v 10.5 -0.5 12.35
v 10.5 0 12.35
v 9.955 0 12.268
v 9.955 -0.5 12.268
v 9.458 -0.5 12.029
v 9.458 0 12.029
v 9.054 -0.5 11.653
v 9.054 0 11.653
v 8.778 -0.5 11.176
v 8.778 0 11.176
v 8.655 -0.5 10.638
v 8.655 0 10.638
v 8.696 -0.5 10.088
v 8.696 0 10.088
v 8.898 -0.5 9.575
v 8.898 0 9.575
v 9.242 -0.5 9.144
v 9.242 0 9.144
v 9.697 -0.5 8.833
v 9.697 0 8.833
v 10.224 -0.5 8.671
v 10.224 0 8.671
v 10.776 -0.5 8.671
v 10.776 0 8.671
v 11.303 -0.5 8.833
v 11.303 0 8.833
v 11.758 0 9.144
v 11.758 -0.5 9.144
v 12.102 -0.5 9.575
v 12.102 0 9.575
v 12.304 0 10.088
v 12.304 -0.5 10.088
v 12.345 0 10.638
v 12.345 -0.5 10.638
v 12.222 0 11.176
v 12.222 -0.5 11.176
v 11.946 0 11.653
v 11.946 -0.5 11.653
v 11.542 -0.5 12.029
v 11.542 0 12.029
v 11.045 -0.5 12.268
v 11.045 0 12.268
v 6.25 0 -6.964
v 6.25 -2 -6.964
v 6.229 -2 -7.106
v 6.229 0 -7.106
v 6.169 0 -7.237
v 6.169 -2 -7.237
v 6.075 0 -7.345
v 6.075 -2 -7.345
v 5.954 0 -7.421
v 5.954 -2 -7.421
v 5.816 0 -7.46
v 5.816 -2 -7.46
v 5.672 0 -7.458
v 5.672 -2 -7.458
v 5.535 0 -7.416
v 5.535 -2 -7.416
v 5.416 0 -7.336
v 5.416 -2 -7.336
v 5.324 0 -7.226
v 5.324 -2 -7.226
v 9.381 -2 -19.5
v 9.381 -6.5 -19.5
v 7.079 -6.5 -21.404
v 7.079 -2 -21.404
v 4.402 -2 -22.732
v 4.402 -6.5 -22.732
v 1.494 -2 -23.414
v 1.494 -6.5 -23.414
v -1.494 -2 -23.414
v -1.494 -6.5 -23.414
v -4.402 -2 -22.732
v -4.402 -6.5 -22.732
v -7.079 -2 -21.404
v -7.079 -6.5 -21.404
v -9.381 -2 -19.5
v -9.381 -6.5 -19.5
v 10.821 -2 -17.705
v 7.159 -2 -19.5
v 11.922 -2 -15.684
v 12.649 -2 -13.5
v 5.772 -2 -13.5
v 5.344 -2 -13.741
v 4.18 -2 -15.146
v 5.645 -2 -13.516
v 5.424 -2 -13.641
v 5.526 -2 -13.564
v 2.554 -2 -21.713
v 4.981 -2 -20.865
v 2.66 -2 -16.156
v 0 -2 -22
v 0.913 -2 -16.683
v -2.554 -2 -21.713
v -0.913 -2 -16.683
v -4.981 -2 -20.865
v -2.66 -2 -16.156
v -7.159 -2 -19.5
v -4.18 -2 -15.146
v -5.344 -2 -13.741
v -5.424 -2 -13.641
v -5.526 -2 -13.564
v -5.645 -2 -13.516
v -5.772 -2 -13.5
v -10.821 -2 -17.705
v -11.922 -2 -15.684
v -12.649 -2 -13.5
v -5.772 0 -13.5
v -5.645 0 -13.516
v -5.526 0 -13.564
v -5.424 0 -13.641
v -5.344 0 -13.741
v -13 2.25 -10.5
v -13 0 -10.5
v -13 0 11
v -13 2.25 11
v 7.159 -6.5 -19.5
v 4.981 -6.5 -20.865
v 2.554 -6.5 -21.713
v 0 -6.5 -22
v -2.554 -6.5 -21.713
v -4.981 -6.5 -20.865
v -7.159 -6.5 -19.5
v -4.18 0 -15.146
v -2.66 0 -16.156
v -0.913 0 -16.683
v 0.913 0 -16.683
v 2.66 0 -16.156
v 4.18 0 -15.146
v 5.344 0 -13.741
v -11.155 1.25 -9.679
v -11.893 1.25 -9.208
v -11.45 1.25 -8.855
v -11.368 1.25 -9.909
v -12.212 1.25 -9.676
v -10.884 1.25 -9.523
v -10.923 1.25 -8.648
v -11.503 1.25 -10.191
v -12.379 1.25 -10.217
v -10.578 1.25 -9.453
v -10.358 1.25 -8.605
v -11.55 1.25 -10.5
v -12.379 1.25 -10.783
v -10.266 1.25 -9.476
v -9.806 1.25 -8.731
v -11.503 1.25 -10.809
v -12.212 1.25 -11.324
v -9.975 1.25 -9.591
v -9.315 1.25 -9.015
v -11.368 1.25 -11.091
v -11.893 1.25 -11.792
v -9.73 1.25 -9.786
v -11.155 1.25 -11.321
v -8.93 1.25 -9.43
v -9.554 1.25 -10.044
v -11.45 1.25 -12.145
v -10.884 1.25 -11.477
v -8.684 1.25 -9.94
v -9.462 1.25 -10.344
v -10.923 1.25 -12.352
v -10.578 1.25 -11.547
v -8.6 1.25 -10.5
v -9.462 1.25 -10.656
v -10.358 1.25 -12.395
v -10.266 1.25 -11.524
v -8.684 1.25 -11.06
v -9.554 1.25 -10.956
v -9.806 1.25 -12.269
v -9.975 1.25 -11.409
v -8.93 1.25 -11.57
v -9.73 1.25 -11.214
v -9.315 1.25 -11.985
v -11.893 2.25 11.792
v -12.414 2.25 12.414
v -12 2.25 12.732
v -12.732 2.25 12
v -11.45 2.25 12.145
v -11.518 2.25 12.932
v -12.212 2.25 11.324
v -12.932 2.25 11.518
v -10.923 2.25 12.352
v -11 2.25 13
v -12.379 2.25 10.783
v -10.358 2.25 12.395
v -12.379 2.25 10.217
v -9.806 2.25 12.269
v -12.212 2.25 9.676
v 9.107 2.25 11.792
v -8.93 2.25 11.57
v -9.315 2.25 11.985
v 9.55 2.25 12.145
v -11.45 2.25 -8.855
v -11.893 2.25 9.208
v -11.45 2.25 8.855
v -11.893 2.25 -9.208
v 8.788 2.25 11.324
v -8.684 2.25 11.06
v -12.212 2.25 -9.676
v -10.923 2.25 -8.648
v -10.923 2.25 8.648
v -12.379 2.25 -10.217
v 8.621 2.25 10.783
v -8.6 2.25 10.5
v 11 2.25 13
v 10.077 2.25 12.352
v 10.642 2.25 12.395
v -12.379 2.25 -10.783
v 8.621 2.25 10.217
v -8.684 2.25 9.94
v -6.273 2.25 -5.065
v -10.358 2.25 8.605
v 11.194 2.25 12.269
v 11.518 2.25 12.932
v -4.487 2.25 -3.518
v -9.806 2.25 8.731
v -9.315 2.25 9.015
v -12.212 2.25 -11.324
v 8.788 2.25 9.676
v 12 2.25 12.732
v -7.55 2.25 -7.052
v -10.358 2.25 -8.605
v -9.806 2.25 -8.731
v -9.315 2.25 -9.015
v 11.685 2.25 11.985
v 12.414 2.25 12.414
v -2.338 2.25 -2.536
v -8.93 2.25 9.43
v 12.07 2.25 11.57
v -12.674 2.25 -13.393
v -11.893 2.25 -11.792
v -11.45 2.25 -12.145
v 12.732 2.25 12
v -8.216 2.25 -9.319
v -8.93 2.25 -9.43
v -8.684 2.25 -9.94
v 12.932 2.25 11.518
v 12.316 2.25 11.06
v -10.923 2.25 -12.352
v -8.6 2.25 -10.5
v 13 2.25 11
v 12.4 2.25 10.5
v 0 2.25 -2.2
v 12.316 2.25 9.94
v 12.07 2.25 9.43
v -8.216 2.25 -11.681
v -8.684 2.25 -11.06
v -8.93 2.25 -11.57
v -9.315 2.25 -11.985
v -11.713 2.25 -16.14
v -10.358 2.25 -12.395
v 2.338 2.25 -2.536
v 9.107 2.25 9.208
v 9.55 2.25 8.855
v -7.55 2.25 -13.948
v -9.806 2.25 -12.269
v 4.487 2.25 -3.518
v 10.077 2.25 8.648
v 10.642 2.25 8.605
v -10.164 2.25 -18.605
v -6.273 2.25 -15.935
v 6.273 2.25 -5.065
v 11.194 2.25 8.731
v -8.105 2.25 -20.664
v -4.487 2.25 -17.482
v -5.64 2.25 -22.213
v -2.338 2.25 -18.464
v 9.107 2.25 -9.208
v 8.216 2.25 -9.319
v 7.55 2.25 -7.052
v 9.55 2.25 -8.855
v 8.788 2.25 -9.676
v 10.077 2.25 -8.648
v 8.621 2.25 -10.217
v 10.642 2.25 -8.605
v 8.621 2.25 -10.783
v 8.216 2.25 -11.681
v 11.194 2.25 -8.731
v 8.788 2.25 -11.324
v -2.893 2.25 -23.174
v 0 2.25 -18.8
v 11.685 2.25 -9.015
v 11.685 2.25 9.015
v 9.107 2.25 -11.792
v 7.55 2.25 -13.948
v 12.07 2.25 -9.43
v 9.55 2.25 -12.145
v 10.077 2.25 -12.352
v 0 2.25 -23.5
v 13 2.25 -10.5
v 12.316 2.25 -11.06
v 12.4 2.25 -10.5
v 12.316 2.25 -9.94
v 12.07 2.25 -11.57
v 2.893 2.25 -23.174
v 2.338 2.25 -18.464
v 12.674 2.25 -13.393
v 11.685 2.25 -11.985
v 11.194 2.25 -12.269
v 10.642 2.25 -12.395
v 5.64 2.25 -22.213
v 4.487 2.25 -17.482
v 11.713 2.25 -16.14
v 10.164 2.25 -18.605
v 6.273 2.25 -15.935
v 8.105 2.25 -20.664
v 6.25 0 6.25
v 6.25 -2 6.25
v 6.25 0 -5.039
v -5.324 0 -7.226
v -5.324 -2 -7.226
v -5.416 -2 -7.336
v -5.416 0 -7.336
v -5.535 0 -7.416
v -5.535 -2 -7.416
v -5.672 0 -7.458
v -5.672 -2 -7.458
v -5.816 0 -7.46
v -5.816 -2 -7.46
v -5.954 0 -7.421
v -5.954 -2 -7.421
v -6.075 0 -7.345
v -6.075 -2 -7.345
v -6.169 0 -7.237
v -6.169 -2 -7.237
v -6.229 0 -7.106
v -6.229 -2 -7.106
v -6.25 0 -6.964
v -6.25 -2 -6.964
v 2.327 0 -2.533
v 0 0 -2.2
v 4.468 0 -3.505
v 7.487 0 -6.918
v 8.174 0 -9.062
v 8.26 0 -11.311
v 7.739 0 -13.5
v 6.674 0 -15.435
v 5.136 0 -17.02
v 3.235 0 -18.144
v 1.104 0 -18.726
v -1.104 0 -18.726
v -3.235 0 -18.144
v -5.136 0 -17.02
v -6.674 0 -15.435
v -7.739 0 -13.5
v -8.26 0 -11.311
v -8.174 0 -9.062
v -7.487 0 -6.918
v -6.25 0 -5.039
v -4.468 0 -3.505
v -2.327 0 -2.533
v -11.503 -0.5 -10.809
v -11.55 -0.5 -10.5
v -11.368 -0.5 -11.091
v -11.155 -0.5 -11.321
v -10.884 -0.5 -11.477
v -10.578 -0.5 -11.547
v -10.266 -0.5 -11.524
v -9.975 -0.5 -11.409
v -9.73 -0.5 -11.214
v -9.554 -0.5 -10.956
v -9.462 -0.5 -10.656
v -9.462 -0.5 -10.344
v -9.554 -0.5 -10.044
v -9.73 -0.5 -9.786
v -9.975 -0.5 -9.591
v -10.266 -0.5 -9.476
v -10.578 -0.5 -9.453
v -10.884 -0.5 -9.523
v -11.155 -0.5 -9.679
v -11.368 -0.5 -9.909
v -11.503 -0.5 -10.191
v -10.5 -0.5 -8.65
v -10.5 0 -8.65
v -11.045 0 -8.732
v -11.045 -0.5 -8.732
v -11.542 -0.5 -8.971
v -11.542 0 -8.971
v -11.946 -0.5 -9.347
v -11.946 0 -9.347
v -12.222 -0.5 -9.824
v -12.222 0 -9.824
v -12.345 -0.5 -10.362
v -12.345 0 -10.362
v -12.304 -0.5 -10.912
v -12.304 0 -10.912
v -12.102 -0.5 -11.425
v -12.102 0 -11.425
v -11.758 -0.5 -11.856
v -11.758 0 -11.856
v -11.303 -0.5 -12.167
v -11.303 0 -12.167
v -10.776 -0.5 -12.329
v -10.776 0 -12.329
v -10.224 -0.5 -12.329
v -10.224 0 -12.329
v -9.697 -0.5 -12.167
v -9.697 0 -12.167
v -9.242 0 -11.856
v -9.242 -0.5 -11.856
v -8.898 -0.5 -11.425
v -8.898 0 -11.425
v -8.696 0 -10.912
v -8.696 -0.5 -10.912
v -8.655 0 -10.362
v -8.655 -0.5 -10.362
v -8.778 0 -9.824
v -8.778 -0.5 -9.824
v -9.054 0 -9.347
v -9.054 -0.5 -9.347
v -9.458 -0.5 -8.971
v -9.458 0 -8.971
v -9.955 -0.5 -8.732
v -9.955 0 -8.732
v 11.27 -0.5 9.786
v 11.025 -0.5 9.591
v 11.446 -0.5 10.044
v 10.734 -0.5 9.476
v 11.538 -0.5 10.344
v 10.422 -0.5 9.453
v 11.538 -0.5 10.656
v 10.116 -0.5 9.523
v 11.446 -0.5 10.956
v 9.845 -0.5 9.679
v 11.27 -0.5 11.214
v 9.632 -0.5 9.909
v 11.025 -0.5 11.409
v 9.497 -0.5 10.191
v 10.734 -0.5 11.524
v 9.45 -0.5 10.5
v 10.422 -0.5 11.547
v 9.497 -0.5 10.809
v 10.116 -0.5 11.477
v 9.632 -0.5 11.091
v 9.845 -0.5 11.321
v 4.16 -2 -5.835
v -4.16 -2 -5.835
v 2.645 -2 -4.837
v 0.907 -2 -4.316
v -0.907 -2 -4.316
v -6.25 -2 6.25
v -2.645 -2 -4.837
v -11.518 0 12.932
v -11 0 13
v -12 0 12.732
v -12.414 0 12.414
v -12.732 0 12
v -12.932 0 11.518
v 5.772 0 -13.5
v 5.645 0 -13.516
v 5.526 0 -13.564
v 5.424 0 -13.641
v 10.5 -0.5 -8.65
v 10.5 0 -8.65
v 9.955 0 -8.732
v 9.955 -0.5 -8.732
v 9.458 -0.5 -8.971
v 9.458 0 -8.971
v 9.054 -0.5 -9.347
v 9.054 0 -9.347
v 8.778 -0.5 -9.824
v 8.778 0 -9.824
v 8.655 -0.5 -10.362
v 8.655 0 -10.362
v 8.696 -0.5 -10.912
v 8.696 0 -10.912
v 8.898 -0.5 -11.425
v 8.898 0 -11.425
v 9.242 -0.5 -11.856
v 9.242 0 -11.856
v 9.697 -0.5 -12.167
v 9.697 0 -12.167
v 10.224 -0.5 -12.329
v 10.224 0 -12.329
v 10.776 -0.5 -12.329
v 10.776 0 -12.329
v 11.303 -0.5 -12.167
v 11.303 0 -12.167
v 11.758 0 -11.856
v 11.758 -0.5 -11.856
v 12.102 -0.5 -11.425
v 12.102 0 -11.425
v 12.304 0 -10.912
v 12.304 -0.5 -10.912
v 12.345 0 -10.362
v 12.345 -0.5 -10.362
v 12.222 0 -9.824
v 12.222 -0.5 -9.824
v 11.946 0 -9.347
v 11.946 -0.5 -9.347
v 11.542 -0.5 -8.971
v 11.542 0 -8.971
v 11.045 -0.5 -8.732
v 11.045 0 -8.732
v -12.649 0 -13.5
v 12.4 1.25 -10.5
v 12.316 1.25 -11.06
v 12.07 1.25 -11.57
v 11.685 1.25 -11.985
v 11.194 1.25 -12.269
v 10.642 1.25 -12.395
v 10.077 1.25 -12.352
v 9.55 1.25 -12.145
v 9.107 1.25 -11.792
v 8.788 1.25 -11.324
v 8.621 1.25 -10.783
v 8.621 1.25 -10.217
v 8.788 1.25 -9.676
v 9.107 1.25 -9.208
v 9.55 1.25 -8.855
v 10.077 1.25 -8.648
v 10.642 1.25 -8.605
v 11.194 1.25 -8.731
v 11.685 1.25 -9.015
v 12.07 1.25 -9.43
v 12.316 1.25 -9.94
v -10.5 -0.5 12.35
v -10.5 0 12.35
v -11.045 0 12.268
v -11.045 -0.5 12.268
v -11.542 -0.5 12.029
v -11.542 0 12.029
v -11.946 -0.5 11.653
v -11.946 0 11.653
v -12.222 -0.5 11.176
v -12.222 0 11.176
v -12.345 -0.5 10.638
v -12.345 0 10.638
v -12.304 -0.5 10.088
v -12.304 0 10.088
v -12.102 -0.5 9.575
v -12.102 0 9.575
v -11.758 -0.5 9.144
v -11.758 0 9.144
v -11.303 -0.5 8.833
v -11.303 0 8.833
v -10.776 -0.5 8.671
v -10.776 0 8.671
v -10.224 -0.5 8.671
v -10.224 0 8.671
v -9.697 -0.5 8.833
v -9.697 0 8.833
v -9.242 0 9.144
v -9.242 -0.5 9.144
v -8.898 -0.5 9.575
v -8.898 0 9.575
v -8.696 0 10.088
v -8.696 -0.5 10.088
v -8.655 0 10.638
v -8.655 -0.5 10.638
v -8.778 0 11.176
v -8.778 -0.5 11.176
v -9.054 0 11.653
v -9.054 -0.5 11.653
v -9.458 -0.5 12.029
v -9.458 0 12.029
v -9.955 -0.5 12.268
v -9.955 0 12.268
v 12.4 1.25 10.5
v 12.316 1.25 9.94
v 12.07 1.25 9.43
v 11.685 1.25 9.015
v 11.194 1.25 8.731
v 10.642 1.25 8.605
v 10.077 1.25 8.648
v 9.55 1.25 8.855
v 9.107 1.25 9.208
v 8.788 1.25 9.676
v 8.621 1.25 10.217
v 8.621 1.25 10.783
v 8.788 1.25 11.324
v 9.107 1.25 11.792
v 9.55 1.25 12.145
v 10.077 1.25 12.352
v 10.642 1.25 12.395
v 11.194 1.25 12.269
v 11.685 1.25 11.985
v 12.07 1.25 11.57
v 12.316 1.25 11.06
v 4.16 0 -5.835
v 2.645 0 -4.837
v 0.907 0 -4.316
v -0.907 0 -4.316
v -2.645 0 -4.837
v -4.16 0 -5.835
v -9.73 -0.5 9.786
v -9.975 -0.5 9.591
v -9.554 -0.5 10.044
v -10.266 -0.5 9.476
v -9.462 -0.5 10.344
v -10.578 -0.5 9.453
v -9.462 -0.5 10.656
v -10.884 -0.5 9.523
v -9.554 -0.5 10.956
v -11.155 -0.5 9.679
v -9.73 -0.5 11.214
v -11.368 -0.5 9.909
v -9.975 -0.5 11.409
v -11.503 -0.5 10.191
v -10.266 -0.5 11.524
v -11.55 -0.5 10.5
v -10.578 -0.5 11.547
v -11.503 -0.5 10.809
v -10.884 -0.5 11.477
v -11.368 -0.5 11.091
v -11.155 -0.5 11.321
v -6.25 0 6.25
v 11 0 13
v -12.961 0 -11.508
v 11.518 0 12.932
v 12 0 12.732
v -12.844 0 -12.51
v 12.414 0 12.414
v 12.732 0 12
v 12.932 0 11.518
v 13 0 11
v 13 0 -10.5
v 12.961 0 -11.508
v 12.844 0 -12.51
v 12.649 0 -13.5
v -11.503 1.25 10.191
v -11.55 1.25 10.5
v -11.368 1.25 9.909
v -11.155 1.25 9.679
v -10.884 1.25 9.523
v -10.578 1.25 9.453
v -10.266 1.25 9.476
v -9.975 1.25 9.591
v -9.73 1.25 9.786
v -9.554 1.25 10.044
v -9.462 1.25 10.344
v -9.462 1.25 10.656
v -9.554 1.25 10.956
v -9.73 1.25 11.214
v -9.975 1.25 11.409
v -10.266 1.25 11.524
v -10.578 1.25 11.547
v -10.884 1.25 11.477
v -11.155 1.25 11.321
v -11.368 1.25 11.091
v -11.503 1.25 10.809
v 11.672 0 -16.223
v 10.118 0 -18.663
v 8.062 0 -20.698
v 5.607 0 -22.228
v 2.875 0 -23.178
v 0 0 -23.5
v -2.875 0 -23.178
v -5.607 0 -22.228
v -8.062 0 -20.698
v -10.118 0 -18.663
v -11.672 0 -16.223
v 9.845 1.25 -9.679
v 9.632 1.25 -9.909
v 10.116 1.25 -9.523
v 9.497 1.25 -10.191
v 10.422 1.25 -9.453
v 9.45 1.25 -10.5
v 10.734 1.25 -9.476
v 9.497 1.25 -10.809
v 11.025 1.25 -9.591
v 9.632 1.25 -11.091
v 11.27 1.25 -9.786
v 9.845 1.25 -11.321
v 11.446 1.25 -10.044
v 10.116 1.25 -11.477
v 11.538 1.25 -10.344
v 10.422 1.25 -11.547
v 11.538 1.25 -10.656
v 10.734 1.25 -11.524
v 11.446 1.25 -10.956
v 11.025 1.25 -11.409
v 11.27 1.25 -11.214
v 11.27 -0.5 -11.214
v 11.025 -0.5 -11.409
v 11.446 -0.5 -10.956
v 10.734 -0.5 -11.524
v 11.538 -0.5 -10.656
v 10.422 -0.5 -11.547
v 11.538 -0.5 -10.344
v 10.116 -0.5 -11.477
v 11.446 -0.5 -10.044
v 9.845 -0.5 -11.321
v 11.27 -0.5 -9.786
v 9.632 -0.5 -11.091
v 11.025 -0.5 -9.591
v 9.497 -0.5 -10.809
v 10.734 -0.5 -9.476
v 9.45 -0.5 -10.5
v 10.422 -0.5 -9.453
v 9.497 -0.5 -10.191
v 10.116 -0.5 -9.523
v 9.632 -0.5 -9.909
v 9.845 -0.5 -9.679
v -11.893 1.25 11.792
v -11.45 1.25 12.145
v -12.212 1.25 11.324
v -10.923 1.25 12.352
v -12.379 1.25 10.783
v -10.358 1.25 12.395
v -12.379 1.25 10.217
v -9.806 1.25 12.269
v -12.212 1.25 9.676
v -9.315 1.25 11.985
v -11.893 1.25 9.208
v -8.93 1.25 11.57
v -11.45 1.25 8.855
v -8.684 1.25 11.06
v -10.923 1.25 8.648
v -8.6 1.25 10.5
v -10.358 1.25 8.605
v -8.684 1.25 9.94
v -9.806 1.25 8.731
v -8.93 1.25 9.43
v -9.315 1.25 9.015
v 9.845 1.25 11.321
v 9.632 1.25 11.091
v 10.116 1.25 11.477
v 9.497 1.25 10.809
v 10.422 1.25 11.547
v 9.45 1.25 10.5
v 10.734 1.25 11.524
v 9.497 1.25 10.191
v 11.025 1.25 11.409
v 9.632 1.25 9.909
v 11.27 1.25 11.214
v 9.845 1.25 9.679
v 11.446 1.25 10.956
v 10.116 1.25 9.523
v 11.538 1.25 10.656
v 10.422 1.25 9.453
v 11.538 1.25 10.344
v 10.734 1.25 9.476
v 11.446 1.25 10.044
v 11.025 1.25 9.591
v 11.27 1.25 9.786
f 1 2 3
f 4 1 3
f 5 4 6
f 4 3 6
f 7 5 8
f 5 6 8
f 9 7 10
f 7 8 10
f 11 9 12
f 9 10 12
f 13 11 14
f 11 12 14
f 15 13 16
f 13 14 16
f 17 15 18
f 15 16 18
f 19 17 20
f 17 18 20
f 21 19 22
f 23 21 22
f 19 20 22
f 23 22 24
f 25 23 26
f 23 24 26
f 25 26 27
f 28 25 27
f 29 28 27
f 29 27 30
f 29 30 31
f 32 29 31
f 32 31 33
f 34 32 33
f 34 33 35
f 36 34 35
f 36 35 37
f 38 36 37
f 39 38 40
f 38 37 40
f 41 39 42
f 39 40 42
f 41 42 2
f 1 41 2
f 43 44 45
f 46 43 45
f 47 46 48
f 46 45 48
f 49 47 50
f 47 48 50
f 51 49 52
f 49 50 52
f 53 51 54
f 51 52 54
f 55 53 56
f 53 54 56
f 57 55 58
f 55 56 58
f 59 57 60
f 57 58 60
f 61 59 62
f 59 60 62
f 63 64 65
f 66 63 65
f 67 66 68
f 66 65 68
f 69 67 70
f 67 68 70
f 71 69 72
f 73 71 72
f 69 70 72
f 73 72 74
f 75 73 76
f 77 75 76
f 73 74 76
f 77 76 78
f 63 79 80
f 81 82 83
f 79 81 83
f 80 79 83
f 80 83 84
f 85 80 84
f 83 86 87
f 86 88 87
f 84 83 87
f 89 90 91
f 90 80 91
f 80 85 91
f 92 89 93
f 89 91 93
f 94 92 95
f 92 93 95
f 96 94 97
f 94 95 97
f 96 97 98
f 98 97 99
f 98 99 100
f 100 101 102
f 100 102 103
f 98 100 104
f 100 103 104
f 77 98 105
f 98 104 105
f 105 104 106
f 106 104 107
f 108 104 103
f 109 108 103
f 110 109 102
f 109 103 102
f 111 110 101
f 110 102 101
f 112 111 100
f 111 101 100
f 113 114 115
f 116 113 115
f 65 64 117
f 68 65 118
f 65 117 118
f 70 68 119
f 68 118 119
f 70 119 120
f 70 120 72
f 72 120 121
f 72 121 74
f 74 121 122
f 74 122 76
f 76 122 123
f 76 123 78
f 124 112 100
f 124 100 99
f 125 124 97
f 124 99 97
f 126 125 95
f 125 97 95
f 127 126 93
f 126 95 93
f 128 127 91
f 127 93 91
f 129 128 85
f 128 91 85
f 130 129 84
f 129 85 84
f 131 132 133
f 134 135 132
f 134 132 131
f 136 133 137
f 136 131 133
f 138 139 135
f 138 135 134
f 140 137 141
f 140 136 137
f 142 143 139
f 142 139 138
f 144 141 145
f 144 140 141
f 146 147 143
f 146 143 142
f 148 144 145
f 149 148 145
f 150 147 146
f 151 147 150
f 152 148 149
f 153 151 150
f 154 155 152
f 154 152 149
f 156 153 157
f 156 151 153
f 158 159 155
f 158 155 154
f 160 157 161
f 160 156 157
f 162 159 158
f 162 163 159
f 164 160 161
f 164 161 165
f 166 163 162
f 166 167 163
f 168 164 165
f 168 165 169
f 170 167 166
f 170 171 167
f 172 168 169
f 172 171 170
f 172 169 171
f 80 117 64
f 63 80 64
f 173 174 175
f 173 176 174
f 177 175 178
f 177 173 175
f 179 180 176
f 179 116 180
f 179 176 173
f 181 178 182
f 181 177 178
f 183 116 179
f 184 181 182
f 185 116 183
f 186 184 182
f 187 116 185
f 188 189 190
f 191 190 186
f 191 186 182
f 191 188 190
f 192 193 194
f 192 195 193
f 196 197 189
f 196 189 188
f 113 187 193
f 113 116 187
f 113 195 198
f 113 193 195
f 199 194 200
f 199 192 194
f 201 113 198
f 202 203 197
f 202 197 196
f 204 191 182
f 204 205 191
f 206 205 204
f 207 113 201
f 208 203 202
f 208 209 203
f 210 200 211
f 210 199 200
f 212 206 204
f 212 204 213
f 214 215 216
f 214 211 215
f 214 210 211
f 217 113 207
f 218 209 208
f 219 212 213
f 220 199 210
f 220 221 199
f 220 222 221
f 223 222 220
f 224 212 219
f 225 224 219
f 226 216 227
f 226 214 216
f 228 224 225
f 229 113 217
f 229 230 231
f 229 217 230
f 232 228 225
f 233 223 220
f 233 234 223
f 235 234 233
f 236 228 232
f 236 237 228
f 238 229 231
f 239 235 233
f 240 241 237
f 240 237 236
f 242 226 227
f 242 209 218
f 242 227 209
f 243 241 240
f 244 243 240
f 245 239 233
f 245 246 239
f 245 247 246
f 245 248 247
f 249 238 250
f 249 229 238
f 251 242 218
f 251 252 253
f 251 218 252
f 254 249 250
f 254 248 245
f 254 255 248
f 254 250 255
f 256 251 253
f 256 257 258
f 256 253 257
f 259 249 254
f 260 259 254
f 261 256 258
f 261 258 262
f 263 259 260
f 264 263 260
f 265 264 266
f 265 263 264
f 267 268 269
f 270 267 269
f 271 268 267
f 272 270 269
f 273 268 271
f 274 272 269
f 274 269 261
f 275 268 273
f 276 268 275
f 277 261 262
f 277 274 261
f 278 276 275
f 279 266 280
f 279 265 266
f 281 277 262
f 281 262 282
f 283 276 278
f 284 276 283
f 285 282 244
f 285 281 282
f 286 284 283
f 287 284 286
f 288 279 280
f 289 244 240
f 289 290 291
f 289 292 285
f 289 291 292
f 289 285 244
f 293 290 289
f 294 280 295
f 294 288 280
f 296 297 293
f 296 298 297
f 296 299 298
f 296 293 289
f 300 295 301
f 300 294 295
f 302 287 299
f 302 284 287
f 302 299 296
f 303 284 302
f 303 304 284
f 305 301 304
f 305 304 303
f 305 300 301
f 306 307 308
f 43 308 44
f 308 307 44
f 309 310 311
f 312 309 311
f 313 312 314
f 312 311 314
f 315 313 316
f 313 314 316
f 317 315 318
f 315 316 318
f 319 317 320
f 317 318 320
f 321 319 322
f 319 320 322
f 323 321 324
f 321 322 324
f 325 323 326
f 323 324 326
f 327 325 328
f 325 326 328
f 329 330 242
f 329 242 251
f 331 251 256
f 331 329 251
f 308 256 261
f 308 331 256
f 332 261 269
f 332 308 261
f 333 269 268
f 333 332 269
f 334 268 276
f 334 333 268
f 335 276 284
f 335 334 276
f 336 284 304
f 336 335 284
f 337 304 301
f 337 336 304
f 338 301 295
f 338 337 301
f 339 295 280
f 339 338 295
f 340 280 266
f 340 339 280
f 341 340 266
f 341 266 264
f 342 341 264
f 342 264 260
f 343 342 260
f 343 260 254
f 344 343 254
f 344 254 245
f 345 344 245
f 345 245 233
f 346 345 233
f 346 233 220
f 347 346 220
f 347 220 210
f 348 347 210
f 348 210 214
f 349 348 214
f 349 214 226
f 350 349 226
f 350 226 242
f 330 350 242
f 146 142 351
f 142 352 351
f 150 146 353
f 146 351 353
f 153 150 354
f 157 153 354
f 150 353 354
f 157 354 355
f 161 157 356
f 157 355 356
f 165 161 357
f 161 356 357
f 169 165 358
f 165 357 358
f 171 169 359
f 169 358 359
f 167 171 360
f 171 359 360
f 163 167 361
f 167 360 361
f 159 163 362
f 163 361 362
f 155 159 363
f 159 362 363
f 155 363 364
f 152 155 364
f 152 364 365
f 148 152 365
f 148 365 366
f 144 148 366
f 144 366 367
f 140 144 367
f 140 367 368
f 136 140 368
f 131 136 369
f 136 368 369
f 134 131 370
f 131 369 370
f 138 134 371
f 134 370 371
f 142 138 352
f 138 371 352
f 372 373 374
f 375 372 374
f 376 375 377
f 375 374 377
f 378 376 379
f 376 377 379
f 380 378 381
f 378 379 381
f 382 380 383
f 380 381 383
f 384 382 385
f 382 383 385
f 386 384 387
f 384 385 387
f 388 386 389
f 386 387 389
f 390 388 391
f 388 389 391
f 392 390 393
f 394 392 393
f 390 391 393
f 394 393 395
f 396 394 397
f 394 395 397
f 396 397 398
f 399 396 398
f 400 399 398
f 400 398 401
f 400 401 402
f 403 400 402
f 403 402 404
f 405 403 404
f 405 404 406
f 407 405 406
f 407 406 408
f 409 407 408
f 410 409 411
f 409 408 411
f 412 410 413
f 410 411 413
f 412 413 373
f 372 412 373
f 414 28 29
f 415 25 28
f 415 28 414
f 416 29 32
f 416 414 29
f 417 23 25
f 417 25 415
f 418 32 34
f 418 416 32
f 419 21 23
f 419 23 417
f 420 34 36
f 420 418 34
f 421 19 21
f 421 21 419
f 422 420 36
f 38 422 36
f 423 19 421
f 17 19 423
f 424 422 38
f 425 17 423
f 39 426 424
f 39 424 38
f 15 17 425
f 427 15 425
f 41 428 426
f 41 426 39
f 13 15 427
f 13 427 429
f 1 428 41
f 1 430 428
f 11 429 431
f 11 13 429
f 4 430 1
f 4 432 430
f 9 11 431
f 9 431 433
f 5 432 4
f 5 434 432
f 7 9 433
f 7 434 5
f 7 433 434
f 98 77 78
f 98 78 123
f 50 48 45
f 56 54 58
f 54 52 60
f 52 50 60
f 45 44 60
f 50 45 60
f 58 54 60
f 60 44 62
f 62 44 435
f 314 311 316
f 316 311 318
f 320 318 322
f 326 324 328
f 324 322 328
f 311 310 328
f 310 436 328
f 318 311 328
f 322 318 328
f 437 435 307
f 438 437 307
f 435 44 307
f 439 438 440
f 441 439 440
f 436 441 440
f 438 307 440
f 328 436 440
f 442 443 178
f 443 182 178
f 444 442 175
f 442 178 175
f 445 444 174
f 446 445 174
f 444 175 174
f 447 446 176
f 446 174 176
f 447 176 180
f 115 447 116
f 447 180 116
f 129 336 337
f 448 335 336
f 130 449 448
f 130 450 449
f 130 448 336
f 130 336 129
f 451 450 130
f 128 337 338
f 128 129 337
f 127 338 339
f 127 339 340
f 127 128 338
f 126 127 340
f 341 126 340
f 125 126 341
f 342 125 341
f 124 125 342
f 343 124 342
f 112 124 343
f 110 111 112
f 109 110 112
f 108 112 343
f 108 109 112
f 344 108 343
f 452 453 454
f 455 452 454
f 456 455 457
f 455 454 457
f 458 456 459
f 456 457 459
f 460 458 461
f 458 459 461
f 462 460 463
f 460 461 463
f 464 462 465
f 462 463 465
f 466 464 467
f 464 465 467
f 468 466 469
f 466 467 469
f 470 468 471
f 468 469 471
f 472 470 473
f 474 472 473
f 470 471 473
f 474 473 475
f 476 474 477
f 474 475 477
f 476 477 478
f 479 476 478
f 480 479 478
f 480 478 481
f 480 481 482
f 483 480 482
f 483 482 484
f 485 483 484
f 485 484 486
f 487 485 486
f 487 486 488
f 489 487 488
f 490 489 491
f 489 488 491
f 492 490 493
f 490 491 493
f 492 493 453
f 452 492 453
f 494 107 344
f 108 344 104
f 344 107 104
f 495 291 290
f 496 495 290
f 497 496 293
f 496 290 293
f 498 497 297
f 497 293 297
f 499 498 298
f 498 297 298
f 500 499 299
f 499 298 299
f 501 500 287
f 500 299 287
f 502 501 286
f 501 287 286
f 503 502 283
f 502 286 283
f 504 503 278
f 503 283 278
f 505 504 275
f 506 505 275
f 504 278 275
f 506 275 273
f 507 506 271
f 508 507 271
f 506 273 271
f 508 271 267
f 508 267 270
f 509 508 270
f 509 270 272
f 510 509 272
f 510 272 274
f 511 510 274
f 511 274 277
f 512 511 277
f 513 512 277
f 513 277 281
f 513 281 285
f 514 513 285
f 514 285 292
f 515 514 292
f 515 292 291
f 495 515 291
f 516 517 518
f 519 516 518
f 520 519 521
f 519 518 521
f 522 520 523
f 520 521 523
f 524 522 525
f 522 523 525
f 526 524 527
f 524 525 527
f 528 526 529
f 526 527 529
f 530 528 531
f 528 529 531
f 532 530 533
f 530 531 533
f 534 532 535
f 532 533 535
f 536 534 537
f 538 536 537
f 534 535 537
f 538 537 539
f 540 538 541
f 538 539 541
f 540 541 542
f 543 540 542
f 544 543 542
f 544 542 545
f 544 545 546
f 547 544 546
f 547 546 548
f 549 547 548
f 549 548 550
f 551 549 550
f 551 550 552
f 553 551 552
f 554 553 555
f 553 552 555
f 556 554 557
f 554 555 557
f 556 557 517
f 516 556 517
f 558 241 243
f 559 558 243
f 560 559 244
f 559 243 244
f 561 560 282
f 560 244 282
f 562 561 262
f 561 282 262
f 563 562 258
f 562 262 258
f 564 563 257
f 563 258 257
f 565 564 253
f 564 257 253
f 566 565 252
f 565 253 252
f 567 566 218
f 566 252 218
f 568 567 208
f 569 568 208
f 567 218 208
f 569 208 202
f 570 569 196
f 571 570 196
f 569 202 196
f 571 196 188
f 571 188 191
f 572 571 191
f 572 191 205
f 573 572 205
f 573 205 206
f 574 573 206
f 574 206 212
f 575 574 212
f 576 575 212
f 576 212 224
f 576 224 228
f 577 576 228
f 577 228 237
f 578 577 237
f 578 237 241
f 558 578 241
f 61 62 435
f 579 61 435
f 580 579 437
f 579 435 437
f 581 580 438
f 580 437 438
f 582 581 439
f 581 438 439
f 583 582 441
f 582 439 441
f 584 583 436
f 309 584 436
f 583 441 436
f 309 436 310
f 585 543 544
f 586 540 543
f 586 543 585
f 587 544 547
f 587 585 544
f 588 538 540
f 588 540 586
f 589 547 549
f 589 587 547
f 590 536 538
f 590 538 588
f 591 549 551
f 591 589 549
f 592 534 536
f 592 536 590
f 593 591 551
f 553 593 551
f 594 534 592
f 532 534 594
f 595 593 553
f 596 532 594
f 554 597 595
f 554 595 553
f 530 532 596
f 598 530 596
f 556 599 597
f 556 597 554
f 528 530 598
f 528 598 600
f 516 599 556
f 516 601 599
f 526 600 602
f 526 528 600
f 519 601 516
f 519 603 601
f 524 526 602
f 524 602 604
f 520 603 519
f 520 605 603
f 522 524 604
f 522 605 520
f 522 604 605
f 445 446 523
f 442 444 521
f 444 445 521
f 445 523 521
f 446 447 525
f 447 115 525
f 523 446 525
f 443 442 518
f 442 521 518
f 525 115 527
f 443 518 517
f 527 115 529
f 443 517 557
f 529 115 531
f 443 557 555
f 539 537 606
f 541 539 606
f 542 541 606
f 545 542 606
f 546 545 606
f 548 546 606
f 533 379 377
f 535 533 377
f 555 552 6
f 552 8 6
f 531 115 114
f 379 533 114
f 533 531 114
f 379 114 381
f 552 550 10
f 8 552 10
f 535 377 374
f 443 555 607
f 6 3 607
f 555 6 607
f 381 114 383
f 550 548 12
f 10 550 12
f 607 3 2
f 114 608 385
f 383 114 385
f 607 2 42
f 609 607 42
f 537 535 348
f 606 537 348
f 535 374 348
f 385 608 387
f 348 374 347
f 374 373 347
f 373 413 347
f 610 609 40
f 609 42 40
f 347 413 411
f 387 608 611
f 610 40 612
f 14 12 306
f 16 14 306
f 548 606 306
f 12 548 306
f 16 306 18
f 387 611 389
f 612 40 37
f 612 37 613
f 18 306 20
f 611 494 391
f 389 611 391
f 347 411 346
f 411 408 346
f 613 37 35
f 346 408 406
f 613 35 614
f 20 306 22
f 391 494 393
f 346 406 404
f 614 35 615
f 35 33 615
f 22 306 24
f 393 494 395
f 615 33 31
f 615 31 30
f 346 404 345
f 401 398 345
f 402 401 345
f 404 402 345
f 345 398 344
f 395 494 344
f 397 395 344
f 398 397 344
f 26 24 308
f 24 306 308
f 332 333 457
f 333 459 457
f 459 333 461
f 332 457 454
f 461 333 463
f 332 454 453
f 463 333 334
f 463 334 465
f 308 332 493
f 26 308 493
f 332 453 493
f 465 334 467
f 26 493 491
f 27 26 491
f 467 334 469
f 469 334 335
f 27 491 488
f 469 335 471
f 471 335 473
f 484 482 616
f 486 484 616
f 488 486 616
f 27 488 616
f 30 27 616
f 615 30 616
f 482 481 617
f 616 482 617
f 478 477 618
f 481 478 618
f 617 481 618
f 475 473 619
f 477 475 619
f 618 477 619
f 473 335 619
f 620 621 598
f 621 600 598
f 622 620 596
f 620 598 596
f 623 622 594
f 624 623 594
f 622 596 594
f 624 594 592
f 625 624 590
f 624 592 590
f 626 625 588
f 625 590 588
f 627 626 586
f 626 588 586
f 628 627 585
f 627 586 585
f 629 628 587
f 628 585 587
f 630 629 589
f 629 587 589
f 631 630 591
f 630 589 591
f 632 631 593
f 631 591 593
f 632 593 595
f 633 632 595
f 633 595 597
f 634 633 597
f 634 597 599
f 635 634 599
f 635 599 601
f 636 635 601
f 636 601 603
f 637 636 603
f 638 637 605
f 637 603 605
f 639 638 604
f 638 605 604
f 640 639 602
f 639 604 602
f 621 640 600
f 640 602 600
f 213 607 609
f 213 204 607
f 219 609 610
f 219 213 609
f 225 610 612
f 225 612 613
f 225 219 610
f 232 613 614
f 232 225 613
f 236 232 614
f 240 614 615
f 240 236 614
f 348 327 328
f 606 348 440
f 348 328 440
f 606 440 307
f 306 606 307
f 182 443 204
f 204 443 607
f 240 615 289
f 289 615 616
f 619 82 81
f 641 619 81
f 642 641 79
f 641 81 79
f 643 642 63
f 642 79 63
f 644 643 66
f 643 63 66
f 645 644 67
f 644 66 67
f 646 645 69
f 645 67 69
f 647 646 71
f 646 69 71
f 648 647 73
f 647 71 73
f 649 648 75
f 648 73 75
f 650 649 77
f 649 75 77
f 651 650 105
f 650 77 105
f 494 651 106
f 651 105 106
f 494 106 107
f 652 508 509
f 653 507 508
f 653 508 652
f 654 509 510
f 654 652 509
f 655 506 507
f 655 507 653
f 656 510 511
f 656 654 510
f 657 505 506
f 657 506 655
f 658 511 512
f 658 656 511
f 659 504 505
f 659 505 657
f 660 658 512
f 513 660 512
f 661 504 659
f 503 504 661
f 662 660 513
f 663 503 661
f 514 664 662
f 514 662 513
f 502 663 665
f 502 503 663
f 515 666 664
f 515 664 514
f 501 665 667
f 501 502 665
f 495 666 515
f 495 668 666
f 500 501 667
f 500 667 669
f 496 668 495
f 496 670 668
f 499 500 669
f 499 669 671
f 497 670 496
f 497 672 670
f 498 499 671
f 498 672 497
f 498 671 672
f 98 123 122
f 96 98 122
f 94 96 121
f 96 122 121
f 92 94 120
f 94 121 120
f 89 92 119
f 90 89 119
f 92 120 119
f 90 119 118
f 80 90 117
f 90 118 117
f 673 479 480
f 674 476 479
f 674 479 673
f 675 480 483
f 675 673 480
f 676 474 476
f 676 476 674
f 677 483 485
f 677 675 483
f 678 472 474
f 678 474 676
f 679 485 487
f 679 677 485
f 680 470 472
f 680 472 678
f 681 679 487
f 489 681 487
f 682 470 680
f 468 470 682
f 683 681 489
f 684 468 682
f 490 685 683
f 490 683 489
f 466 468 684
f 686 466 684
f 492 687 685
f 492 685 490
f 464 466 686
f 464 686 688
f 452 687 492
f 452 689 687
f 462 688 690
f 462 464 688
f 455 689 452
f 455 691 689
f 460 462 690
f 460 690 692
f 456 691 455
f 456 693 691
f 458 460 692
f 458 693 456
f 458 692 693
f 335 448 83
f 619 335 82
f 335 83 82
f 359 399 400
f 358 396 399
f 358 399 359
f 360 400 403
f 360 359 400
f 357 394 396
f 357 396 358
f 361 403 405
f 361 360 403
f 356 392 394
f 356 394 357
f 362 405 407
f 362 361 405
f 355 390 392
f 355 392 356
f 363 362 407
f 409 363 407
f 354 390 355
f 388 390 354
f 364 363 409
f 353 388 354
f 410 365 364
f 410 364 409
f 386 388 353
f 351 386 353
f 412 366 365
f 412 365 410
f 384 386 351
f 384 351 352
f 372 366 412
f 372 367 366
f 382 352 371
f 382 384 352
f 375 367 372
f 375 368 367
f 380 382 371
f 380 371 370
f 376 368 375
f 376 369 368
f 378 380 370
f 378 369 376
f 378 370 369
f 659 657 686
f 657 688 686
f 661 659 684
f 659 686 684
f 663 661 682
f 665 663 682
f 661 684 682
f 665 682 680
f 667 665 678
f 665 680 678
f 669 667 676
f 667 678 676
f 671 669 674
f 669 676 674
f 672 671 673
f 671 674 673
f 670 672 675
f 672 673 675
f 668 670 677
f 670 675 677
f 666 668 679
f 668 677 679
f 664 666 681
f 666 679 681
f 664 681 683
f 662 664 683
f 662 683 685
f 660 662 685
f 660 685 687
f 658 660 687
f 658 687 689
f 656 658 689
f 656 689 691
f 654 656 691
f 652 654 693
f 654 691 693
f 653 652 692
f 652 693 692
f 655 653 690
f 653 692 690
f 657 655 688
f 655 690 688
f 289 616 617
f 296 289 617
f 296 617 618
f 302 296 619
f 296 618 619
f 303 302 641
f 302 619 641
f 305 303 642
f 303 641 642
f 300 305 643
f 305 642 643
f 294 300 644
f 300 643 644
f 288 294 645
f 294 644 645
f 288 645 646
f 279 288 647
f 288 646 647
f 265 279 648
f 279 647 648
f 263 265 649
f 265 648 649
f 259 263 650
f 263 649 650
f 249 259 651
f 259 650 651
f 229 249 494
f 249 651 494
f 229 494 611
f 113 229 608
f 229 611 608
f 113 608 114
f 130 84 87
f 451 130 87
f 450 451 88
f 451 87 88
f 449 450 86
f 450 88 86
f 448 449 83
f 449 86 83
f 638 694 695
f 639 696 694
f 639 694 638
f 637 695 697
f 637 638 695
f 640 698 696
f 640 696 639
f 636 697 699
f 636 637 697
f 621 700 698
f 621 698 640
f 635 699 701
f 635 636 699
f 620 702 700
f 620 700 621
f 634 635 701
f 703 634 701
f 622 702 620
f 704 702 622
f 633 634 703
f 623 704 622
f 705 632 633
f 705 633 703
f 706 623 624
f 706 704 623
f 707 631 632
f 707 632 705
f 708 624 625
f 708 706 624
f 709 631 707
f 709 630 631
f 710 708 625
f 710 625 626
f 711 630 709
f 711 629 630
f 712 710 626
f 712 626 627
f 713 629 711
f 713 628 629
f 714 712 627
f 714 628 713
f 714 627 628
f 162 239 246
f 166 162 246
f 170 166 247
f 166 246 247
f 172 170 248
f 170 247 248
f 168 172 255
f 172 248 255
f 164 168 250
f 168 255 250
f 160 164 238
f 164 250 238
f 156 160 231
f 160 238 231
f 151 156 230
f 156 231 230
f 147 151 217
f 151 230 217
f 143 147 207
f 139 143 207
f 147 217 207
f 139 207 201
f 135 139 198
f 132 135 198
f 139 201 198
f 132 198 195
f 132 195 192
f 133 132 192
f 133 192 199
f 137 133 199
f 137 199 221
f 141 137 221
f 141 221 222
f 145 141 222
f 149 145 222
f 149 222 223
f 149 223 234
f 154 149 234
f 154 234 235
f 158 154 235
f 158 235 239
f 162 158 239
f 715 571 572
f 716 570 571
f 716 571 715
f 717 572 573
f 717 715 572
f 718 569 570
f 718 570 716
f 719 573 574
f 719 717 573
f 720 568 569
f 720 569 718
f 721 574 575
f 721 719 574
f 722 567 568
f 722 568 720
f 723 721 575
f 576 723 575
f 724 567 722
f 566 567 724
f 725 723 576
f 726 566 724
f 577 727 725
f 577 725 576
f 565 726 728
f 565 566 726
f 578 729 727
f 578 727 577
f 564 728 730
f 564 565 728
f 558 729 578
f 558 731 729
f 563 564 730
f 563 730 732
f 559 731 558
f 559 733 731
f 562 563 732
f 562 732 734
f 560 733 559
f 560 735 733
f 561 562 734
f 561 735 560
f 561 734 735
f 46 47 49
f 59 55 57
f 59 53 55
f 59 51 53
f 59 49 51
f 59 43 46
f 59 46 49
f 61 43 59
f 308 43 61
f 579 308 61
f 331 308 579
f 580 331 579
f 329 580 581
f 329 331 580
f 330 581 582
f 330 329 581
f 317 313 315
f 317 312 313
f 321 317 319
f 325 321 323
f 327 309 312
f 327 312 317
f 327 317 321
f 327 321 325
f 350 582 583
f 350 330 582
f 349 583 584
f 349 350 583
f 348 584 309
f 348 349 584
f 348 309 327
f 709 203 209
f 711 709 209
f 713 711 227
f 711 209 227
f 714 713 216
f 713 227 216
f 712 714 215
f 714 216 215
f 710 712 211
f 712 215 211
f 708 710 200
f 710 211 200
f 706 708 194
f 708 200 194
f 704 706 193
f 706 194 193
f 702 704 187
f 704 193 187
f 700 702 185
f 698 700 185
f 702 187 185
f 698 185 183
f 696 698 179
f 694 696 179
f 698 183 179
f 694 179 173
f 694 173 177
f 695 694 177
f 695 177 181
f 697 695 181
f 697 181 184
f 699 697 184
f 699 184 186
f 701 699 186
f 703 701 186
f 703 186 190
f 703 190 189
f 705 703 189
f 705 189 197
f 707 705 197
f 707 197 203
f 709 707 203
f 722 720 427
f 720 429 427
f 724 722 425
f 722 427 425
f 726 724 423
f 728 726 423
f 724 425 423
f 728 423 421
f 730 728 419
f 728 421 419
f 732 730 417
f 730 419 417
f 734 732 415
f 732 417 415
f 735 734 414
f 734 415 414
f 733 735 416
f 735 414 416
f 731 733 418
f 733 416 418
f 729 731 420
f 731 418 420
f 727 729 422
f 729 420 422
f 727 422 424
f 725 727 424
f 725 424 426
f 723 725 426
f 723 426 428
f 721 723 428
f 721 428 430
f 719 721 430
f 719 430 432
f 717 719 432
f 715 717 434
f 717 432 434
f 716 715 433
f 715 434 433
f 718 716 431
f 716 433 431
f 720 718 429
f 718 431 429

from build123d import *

# Parameters (mm, degrees)
SKETCH_1_R                   = 8.3
EXTRUDE_1_DEPTH              = 2.25
EXTRUDE_START                = 2
EXTRUDE_2_DEPTH              = 2
EXTRUDE_START_2              = 4.5
EXTRUDE_3_DEPTH              = 4.5
EXTRUDE_4_DEPTH              = 2
FILLET_1_R                   = 0.5
SKETCH_5_R                   = 1.85
EXTRUDE_5_DEPTH              = 0.5
HOLE_WIZARD_M2_1_D           = 2.1
HOLE_WIZARD_M2_1_CBORE_D     = 3.8
HOLE_WIZARD_M2_1_CBORE_DEPTH = 1
FILLET_2_R                   = 2


with BuildPart() as part:
    # ｽｹｯﾁ1 → ﾎﾞｽ - 押し出し1 (new body)
    with BuildSketch(Plane(origin=(0, 0, 0), x_dir=(1, 0, 0), z_dir=(0, 1, 0))):
        with BuildLine():
            ThreePointArc((13, 10.5), (0, 23.5), (-13, 10.5))
            Line((-13, 10.5), (-13, -13))
            Line((-13, -13), (13, -13))
            Line((13, -13), (13, 10.5))
        make_face()
        with Locations(Location((0, 10.5, 0), (0, 0, 270))):
            Circle(SKETCH_1_R, mode=Mode.SUBTRACT)
    extrude(amount=EXTRUDE_1_DEPTH)

    # ｽｹｯﾁ2 → ﾎﾞｽ - 押し出し2 (add)
    with BuildSketch(Plane.XZ.offset(EXTRUDE_START)):
        with BuildLine():
            Line((-12.649110641, -13.5), (-5.48292805, -13.5))
            ThreePointArc((-5.48292805, -13.5), (0, -16.75), (5.48292805, -13.5))
            Line((5.48292805, -13.5), (12.649110641, -13.5))
            ThreePointArc((12.649110641, -13.5), (0, -23.5), (-12.649110641, -13.5))
        make_face()
    extrude(amount=-EXTRUDE_2_DEPTH)

    # ｽｹｯﾁ3 → ﾎﾞｽ - 押し出し3 (add)
    with BuildSketch(Plane.XZ.offset(2).offset(EXTRUDE_START_2)):
        with BuildLine():
            Line((-9.38083152, -19.5), (-7.158910532, -19.5))
            ThreePointArc((-7.158910532, -19.5), (0, -22), (7.158910532, -19.5))
            Line((7.158910532, -19.5), (9.38083152, -19.5))
            ThreePointArc((9.38083152, -19.5), (0, -23.5), (-9.38083152, -19.5))
        make_face()
    extrude(amount=-EXTRUDE_3_DEPTH)

    # ｽｹｯﾁ4 → ﾎﾞｽ - 押し出し4 (add)
    with BuildSketch(Plane.XZ.offset(EXTRUDE_START)):
        with BuildLine():
            Line((-6.25, 6.25), (6.25, 6.25))
            Line((6.25, 6.25), (6.25, -10.5))
            ThreePointArc((6.25, -10.5), (0, -4.25), (-6.25, -10.5))
            Line((-6.25, -10.5), (-6.25, 6.25))
        make_face()
    extrude(amount=-EXTRUDE_4_DEPTH)

    # ﾌｨﾚｯﾄ1
    # the kernel refuses this fillet: 0.5 mm, written as the material it takes off along each edge
    with BuildSketch(Plane(origin=(5.48292805, -2.721925351, -13.5), x_dir=(1, 0, 0), z_dir=(0, 1, 0))) as fillet_1_piece_1:
        with BuildLine():
            CenterArc((0.28877014, 0.5), FILLET_1_R, 211.232929016, 58.767070984)
            ThreePointArc((-0.138763059, 0.240740741), (-0.068043475, 0.121141625), (0, 0))
            Line((0, 0), (0.28877014, 0))
        make_face()
    extrude(amount=3.443850702, mode=Mode.SUBTRACT)
    with BuildSketch(Plane(origin=(-5.48292805, -2.721925351, -13.5), x_dir=(-1, 0, 0), z_dir=(0, 1, 0))) as fillet_1_piece_2:
        with BuildLine():
            CenterArc((0.28877014, -0.5), FILLET_1_R, 90, 58.767070984)
            ThreePointArc((-0.138763059, -0.240740741), (-0.068043475, -0.121141625), (0, 0))
            Line((0, 0), (0.28877014, 0))
        make_face()
    extrude(amount=3.443850702, mode=Mode.SUBTRACT)
    with BuildSketch(Plane(origin=(-6.25, -10.838834765, -10.5), x_dir=(0, 0, 1), z_dir=(0, 1, 0))) as fillet_1_piece_3:
        with BuildLine():
            CenterArc((3.535533906, 0.5), FILLET_1_R, 121.586338097, 148.413661903)
            ThreePointArc((3.273642506, 0.925925926), (1.701034544, 0.235934696), (0, 0))
            Line((0, 0), (3.535533906, 0))
        make_face()
    extrude(amount=19.67766953, mode=Mode.SUBTRACT)
    with BuildSketch(Plane(origin=(6.25, -10.838834765, -10.5), x_dir=(0, 0, 1), z_dir=(0, 1, 0))) as fillet_1_piece_4:
        with BuildLine():
            CenterArc((3.535533906, -0.5), FILLET_1_R, 90, 148.413661903)
            ThreePointArc((3.273642506, -0.925925926), (1.701034544, -0.235934696), (0, 0))
            Line((0, 0), (3.535533906, 0))
        make_face()
    extrude(amount=19.67766953, mode=Mode.SUBTRACT)

    # ｽｹｯﾁ5 → ﾎﾞｽ - 押し出し5 (add)
    with BuildSketch(Plane.XZ):
        with Locations(Location((-10.5, 10.5, 0), (0, 0, 90))):
            Circle(SKETCH_5_R)
        with Locations(Location((10.5, 10.5, 0), (0, 0, 90))):
            Circle(SKETCH_5_R)
        with Locations(Location((-10.5, -10.5, 0), (0, 0, 90))):
            Circle(SKETCH_5_R)
        with Locations(Location((10.5, -10.5, 0), (0, 0, 90))):
            Circle(SKETCH_5_R)
    extrude(amount=EXTRUDE_5_DEPTH)

    # M2 丸平ねじ用座ぐり穴1 (through all)
    with Locations(Plane(origin=(0, 2.25, 0), x_dir=(1, 0, 0), z_dir=(0, 1, 0))):
        with Locations((10.5, 10.5), (-10.5, 10.5), (-10.5, -10.5), (10.5, -10.5)):
            CounterBoreHole(HOLE_WIZARD_M2_1_D / 2, HOLE_WIZARD_M2_1_CBORE_D / 2, HOLE_WIZARD_M2_1_CBORE_DEPTH)

    # ﾌｨﾚｯﾄ2
    fillet_2_edges = [part.edges().sort_by_distance(p)[0] for p in [
        (13, 1.125, 13),
        (-13, 1.125, 13),
    ]]
    fillet(fillet_2_edges, radius=FILLET_2_R)


solid = part.part
